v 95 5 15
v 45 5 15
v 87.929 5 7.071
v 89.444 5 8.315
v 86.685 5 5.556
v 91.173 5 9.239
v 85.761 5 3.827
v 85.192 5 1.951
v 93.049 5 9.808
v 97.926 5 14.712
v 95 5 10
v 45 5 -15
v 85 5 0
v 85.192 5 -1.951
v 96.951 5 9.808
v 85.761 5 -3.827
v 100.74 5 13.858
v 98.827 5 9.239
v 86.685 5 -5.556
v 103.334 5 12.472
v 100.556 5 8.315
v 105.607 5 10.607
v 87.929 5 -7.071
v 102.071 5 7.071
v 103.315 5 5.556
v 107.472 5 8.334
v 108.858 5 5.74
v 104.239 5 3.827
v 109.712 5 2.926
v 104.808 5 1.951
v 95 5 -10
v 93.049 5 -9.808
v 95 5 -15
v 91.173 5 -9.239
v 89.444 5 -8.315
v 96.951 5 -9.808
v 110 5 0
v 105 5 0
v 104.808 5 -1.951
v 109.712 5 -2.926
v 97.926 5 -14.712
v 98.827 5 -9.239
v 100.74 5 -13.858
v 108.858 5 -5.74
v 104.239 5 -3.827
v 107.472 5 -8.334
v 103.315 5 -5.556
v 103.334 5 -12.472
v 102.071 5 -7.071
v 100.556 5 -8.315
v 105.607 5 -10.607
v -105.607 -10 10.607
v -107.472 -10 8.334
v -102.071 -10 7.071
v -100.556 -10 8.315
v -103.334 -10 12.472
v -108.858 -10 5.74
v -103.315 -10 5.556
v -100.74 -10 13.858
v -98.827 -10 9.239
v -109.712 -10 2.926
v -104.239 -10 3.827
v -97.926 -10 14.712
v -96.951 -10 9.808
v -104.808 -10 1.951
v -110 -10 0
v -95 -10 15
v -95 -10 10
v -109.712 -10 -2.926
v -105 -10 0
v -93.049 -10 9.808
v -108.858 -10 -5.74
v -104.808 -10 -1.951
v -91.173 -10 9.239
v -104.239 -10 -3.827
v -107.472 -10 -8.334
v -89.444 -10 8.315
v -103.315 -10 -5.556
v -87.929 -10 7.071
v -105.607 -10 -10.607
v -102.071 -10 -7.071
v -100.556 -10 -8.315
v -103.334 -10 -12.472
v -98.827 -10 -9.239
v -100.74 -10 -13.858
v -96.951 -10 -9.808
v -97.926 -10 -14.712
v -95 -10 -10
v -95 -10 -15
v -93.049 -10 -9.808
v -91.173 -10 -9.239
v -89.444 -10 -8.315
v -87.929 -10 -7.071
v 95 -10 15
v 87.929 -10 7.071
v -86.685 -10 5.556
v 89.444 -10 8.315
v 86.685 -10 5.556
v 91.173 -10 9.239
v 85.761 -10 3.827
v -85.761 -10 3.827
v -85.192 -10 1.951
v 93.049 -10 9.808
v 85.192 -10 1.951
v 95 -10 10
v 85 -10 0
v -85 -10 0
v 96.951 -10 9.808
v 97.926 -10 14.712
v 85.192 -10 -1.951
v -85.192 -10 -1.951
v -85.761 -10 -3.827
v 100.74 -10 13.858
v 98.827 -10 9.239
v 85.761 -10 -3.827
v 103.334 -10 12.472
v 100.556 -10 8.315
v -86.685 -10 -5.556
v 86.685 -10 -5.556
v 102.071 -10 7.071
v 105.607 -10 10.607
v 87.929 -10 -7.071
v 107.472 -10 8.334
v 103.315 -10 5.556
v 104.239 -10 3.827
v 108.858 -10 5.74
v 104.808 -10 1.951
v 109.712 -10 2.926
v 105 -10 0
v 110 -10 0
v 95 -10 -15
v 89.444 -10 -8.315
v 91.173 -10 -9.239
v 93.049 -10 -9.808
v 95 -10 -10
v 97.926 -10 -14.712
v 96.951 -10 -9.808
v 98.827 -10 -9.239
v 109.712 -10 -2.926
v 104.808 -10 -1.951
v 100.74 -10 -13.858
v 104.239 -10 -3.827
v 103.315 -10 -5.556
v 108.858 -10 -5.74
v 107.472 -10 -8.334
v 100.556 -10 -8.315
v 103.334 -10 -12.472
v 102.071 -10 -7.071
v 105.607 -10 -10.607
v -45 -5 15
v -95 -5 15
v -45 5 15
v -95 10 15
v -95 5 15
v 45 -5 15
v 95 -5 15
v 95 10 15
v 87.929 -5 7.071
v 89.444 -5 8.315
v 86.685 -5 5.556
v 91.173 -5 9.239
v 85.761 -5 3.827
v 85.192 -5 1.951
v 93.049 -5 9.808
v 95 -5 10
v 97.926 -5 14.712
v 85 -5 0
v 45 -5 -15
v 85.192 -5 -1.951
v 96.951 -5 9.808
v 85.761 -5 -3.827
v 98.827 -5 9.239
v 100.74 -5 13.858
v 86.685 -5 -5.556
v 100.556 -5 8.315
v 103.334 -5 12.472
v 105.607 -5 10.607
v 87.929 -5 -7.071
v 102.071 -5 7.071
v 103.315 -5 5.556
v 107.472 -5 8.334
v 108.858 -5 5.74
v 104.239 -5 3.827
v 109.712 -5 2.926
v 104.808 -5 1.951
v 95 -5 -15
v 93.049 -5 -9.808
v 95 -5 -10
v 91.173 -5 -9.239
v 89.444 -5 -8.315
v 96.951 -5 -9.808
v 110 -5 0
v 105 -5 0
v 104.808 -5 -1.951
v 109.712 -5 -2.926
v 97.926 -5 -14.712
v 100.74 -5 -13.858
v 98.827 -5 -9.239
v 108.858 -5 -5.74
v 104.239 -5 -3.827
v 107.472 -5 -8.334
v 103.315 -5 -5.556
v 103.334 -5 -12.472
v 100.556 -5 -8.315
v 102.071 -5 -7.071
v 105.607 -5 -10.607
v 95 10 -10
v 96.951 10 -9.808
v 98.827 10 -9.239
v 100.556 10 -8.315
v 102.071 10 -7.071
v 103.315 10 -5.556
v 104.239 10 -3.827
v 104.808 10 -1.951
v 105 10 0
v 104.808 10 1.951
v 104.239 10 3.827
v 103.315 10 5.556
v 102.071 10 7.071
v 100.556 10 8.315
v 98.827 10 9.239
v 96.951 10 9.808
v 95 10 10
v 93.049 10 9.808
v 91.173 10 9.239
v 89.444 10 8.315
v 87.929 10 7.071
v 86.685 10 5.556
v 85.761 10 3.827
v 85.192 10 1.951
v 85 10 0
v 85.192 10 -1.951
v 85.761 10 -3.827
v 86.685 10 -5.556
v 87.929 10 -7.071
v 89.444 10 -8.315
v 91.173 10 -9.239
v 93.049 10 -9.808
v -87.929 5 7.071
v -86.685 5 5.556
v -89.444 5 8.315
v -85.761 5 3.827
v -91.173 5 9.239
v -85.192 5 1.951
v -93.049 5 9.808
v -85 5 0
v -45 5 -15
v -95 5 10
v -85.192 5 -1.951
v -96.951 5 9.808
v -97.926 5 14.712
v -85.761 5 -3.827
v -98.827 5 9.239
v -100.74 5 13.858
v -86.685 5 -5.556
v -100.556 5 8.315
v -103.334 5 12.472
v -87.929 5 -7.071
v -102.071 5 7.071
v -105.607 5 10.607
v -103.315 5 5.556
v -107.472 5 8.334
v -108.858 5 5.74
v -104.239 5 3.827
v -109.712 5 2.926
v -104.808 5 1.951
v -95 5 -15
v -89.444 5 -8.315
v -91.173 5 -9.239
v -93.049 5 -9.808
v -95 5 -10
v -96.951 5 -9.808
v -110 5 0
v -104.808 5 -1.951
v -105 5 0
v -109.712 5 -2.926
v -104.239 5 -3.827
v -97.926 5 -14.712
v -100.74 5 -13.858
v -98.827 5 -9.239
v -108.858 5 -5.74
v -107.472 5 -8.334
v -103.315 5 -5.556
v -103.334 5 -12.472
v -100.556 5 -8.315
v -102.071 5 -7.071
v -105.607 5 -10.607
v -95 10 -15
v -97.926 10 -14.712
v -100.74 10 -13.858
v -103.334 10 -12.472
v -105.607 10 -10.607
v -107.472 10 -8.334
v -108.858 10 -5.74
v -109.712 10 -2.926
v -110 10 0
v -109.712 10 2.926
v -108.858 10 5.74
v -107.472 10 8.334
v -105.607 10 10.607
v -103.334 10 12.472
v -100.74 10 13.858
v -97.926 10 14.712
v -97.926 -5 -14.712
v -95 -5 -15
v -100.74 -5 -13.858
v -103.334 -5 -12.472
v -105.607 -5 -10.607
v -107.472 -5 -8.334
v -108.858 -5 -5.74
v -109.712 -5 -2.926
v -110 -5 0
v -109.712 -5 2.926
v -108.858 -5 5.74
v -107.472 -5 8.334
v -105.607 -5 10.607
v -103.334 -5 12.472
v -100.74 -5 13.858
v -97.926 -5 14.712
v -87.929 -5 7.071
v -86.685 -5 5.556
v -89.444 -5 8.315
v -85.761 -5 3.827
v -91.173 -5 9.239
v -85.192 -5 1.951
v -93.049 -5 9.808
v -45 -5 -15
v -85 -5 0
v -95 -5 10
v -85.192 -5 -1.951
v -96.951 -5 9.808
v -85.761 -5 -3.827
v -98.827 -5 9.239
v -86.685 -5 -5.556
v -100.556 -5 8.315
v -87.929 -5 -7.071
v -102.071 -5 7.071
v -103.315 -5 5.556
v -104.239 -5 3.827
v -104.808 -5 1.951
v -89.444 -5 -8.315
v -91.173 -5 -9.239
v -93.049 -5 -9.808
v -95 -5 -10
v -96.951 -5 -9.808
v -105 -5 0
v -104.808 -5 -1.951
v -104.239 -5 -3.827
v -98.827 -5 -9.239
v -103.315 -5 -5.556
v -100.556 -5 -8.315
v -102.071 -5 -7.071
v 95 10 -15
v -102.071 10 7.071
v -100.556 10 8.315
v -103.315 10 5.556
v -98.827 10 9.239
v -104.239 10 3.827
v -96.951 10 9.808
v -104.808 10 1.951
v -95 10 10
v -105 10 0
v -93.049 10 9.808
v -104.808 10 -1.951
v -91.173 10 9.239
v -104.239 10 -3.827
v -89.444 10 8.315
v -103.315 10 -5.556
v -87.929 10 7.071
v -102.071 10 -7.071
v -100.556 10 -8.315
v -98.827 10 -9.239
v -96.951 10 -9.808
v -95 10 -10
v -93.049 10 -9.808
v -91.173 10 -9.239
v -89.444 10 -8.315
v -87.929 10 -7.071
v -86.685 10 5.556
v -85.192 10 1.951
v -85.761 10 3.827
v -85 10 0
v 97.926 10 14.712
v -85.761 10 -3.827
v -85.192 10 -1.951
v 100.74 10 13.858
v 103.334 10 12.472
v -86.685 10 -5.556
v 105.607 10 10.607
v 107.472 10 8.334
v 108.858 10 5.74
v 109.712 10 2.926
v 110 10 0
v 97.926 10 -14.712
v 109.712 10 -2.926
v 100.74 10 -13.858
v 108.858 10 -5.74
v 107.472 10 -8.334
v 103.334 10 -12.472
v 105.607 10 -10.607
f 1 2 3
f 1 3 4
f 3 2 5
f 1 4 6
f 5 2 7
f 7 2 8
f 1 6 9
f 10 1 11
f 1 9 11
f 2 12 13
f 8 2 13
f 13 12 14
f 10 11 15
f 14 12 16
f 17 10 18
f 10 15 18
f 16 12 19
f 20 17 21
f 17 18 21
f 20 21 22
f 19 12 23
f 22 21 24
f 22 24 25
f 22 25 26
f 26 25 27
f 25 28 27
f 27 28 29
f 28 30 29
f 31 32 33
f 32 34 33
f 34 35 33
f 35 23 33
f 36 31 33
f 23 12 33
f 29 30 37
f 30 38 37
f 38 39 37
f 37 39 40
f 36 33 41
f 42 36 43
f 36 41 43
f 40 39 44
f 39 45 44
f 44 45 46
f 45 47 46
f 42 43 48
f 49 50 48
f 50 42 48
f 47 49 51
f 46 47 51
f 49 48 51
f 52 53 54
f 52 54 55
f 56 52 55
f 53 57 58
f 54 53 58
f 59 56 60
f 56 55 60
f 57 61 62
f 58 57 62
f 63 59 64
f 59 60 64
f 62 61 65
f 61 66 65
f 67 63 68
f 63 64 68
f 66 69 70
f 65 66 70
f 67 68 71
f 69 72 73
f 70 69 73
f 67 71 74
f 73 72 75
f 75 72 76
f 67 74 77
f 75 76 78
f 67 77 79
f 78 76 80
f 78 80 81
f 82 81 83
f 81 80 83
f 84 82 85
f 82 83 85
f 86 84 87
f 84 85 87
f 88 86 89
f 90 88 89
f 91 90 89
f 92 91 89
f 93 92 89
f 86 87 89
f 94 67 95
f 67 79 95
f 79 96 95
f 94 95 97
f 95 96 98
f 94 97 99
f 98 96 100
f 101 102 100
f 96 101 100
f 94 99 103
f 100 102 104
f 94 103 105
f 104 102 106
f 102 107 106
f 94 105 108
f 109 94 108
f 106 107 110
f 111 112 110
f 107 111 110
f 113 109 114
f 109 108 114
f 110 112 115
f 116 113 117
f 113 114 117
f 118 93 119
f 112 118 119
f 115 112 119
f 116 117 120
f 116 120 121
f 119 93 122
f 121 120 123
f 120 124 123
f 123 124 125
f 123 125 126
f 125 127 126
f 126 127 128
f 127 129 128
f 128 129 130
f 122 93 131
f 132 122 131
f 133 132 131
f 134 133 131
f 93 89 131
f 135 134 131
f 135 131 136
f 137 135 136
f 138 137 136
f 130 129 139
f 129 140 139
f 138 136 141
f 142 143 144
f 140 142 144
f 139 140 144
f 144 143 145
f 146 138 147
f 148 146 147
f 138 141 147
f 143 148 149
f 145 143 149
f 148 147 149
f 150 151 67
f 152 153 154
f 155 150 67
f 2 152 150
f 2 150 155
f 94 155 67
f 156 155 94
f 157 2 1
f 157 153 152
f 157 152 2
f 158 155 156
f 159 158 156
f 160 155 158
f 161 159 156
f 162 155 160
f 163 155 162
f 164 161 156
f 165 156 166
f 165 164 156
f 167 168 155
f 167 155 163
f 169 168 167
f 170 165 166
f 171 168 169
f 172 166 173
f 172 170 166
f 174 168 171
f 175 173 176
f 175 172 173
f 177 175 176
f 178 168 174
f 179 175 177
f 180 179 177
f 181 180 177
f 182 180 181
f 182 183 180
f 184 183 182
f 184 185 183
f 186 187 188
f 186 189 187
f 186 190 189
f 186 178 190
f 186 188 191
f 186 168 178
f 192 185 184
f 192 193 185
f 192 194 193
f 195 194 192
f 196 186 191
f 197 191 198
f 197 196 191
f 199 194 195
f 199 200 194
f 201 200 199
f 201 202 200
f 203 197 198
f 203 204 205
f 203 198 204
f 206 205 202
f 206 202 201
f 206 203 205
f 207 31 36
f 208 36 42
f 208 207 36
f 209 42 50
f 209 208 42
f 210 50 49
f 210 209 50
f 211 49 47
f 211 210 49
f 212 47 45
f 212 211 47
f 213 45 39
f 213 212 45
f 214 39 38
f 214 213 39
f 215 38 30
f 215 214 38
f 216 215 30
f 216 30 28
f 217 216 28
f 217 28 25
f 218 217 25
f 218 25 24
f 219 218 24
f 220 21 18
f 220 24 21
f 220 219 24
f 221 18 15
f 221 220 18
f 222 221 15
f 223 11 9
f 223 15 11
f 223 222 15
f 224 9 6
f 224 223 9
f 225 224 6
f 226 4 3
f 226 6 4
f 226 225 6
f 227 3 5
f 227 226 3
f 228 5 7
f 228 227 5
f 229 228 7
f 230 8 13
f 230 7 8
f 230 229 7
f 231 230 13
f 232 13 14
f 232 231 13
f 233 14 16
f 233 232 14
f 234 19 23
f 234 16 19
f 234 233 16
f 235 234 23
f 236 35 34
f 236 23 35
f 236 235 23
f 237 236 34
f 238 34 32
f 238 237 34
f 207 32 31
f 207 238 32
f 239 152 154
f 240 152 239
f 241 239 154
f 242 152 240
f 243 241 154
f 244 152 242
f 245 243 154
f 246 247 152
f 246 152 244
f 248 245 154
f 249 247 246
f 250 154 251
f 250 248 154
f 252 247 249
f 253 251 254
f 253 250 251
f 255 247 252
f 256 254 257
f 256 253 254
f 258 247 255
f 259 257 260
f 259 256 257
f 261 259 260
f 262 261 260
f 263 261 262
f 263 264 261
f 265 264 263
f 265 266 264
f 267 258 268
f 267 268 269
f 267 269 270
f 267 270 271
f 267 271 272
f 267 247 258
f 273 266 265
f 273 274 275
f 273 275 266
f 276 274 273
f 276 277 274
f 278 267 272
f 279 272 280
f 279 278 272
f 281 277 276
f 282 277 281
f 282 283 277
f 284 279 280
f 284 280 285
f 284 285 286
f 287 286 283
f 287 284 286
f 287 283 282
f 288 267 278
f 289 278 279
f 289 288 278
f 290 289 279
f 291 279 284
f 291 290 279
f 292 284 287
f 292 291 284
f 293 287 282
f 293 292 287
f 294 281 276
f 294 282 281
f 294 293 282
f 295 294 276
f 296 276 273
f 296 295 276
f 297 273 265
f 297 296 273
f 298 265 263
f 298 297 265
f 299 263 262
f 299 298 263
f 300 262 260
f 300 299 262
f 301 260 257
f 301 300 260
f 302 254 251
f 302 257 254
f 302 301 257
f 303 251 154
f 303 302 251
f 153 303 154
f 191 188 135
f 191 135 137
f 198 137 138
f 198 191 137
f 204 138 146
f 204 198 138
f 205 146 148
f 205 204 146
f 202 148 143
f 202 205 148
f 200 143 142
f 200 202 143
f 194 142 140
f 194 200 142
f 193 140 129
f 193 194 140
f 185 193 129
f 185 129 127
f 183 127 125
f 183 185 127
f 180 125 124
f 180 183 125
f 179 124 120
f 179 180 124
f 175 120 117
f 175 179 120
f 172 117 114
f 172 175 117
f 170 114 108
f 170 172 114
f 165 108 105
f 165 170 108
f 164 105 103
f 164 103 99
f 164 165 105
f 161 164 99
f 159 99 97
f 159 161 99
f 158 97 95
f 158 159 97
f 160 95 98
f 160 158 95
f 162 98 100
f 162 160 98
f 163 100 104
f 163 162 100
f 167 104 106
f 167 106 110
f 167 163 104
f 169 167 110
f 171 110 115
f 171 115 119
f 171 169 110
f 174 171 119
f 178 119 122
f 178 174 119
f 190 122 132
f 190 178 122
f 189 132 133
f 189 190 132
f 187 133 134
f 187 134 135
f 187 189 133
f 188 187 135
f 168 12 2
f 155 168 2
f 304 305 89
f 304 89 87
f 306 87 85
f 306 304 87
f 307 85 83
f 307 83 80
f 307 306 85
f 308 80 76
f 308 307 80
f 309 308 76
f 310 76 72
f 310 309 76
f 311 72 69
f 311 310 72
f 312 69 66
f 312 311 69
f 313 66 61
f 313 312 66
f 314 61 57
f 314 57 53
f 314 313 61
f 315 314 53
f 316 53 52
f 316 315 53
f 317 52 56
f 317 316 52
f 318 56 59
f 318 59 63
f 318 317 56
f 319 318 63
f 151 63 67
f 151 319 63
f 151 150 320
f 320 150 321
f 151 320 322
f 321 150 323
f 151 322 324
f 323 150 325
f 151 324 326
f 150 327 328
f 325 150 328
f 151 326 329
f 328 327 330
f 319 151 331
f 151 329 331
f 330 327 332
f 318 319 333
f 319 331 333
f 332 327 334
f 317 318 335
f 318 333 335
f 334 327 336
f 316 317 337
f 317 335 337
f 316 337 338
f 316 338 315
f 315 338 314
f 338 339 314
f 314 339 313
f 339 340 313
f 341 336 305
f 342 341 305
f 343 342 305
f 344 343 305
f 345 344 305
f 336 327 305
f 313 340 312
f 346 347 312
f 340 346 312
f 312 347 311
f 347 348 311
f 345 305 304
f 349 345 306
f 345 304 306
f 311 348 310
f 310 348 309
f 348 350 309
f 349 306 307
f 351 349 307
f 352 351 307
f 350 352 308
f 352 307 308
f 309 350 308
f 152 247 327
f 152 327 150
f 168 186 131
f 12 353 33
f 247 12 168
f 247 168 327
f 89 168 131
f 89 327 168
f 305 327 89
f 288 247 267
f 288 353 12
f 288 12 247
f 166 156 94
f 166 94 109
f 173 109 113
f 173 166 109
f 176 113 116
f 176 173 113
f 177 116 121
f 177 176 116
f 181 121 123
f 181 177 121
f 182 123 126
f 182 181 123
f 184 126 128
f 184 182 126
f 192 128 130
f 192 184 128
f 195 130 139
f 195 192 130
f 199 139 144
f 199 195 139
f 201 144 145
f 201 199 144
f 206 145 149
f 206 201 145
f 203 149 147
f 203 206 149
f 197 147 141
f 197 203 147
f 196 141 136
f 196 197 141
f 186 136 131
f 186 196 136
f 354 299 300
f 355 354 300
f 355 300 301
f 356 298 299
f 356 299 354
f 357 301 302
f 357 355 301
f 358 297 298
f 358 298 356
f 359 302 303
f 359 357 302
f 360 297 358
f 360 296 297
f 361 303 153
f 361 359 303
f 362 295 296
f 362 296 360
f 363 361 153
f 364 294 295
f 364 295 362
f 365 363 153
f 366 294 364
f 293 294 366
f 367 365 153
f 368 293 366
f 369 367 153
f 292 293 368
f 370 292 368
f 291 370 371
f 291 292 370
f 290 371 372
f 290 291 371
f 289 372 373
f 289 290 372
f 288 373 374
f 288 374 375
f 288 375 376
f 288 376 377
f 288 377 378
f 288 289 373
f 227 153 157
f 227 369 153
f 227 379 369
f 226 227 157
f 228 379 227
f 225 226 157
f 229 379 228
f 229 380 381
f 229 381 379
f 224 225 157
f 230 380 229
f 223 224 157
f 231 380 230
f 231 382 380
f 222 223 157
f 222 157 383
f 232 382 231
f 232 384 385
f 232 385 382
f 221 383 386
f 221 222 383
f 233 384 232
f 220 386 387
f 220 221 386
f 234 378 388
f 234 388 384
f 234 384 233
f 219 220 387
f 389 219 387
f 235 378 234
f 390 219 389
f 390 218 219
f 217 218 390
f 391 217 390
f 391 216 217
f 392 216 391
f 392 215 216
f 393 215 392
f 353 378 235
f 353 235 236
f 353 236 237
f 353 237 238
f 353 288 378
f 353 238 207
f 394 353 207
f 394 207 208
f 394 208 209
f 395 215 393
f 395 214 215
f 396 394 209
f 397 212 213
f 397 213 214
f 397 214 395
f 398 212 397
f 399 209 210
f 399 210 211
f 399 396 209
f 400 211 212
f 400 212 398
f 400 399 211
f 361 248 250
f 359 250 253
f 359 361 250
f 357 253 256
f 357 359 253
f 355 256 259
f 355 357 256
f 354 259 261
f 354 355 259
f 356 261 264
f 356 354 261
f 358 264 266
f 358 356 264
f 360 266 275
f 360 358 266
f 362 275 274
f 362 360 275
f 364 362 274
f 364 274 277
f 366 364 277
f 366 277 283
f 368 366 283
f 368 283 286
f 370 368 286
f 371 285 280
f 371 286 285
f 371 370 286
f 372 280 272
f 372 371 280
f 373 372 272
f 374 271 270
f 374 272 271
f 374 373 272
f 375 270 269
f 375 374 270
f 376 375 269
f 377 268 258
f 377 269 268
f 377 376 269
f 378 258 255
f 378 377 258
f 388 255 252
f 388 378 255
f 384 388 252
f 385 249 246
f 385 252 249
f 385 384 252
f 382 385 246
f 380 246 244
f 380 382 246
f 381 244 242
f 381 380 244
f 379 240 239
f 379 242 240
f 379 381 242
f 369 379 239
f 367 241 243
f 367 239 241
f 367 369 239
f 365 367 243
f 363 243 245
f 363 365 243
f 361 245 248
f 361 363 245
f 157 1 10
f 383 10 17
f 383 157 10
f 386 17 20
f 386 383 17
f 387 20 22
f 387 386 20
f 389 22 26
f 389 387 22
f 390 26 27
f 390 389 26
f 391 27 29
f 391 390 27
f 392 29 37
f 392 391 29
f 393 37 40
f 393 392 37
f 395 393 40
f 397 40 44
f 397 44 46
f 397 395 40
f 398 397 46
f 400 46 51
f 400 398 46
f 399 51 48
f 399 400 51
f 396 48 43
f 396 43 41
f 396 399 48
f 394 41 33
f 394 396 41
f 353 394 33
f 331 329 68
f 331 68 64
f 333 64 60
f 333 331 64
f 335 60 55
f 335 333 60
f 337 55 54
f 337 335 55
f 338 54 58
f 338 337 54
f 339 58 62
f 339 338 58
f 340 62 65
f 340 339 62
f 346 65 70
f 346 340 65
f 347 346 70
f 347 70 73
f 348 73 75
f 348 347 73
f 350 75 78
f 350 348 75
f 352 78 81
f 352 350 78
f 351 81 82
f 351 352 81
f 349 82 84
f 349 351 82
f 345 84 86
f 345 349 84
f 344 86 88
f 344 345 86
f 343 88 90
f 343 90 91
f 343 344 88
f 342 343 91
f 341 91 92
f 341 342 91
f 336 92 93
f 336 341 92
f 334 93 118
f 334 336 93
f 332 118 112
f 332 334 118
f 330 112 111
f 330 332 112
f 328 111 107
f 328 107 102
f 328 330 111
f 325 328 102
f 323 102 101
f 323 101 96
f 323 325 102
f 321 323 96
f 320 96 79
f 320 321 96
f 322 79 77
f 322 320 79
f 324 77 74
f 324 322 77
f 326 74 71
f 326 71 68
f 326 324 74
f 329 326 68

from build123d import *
from build123d.topology import SkipClean

# Parameters (mm, degrees)
EXTRUDE_1_DEPTH     = 10
CUT_EXTRUDE_1_DEPTH = 5


with BuildPart() as part:
    # 草圖1 → 填料-伸長1 (new, symmetric)
    with BuildSketch(Plane(origin=(0, 0, 0), x_dir=(1, 0, 0), z_dir=(0, 1, 0))):
        with BuildLine():
            Line((95.00000000000004, 14.999999999999998), (-94.99999999999996, 15))
            ThreePointArc((-94.99999999999996, 14.999999999999998), (-84.39339828220174, 10.606601717798211), (-79.99999999999996, 0))
            ThreePointArc((-79.99999999999996, -3.67e-15), (-84.39339828220174, -10.606601717798204), (-94.99999999999994, -14.999999999999998))
            Line((-94.99999999999994, -14.999999999999961), (95.00000000000006, -14.999999999999998))
            ThreePointArc((95.00000000000004, -14.999999999999998), (80.00000000000004, 1.84e-15), (95.00000000000004, 14.999999999999998))
        make_face()
        with BuildLine():
            ThreePointArc((-79.99999999999996, 0), (-84.39339828220174, 10.606601717798211), (-94.99999999999996, 14.999999999999998))
            Line((-94.99999999999996, 15), (-94.99999999999996, 10.000000000000009))
            ThreePointArc((-95, 10.000000000000009), (-87.9289321881345, 7.071067811865497), (-84.99999999999994, 0))
            ThreePointArc((-84.99999999999994, -2.45e-15), (-87.9289321881345, -7.071067811865502), (-95, -10.000000000000009))
            Line((-94.99999999999994, -10.000000000000007), (-94.99999999999994, -14.999999999999961))
            ThreePointArc((-94.99999999999994, -14.999999999999998), (-84.39339828220174, -10.606601717798204), (-79.99999999999996, -3.67e-15))
        make_face()
        with BuildLine():
            Line((-94.99999999999996, 10.000000000000009), (-94.99999999999996, 15))
            ThreePointArc((-94.99999999999996, 14.999999999999998), (-109.99999999999996, -4.82e-15), (-94.99999999999994, -14.999999999999998))
            Line((-94.99999999999994, -14.999999999999961), (-94.99999999999994, -10.000000000000007))
            ThreePointArc((-95, -10.000000000000009), (-104.99999999999997, 1.22e-15), (-95, 10.000000000000009))
        make_face()
        with BuildLine():
            ThreePointArc((-79.99999999999996, 0), (-84.39339828220174, 10.606601717798211), (-94.99999999999996, 14.999999999999998))
            Line((-94.99999999999996, 15), (-94.99999999999996, 10.000000000000009))
            ThreePointArc((-95, 10.000000000000009), (-87.9289321881345, 7.071067811865497), (-84.99999999999994, 0))
            ThreePointArc((-84.99999999999994, -2.45e-15), (-87.9289321881345, -7.071067811865502), (-95, -10.000000000000009))
            Line((-94.99999999999994, -10.000000000000007), (-94.99999999999994, -14.999999999999961))
            ThreePointArc((-94.99999999999994, -14.999999999999998), (-84.39339828220174, -10.606601717798204), (-79.99999999999996, -3.67e-15))
        make_face()
        with BuildLine():
            Line((-94.99999999999996, 10.000000000000009), (-94.99999999999996, 15))
            ThreePointArc((-94.99999999999996, 14.999999999999998), (-109.99999999999996, -4.82e-15), (-94.99999999999994, -14.999999999999998))
            Line((-94.99999999999994, -14.999999999999961), (-94.99999999999994, -10.000000000000007))
            ThreePointArc((-95, -10.000000000000009), (-104.99999999999997, 1.22e-15), (-95, 10.000000000000009))
        make_face()
        with BuildLine():
            ThreePointArc((110.00000000000004, 0), (105.60660171779826, 10.606601717798211), (95.00000000000004, 14.999999999999998))
            Line((95.00000000000004, 14.999999999999998), (95.00000000000004, 10.000000000000009))
            ThreePointArc((95, 10.000000000000009), (102.0710678118655, 7.071067811865497), (105.00000000000006, 0))
            ThreePointArc((105.00000000000006, -2.45e-15), (102.0710678118655, -7.071067811865502), (95, -10.000000000000009))
            Line((95.00000000000004, -10.000000000000009), (95.00000000000004, -14.999999999999998))
            ThreePointArc((95.00000000000004, -14.999999999999998), (105.60660171779826, -10.606601717798213), (110.00000000000004, -3.67e-15))
        make_face()
        with BuildLine():
            Line((95.00000000000004, 10.000000000000009), (95.00000000000004, 14.999999999999998))
            ThreePointArc((95.00000000000004, 14.999999999999998), (80.00000000000004, 1.84e-15), (95.00000000000004, -14.999999999999998))
            Line((95.00000000000004, -14.999999999999998), (95.00000000000004, -10.000000000000009))
            ThreePointArc((95, -10.000000000000009), (85.00000000000003, 1.22e-15), (95, 10.000000000000009))
        make_face()
        with BuildLine():
            ThreePointArc((110.00000000000004, 0), (105.60660171779826, 10.606601717798211), (95.00000000000004, 14.999999999999998))
            Line((95.00000000000004, 14.999999999999998), (95.00000000000004, 10.000000000000009))
            ThreePointArc((95, 10.000000000000009), (102.0710678118655, 7.071067811865497), (105.00000000000006, 0))
            ThreePointArc((105.00000000000006, -2.45e-15), (102.0710678118655, -7.071067811865502), (95, -10.000000000000009))
            Line((95.00000000000004, -10.000000000000009), (95.00000000000004, -14.999999999999998))
            ThreePointArc((95.00000000000004, -14.999999999999998), (105.60660171779826, -10.606601717798213), (110.00000000000004, -3.67e-15))
        make_face()
        with BuildLine():
            Line((95.00000000000004, 10.000000000000009), (95.00000000000004, 14.999999999999998))
            ThreePointArc((95.00000000000004, 14.999999999999998), (80.00000000000004, 1.84e-15), (95.00000000000004, -14.999999999999998))
            Line((95.00000000000004, -14.999999999999998), (95.00000000000004, -10.000000000000009))
            ThreePointArc((95, -10.000000000000009), (85.00000000000003, 1.22e-15), (95, 10.000000000000009))
        make_face()
    extrude(amount=EXTRUDE_1_DEPTH, both=True)

    # 草圖2 → 除料-伸長1 (cut, symmetric)
    with SkipClean():  # the faces are left unmerged after this step: merging them gives an invalid solid
        with BuildSketch(Plane(origin=(0, 0, 0), x_dir=(1, 0, 0), z_dir=(0, 1, 0))):
            with BuildLine():
                Line((-44.99999999999994, 14.99999999999999), (-44.99999999999996, -14.999999999999977))
                Line((-44.99999999999996, -14.999999999999977), (-94.99999999999994, -14.99999999999998))
                ThreePointArc((-94.99999999999994, -14.99999999999998), (-109.99999999999994, -4.82e-15), (-94.99999999999996, 14.99999999999998))
                Line((-94.99999999999996, 14.99999999999998), (-44.99999999999994, 14.99999999999999))
            make_face()
        cut_extrude_1 = extrude(amount=CUT_EXTRUDE_1_DEPTH, both=True, mode=Mode.SUBTRACT)

    # 鏡射1: 除料-伸長1 across plane
    with SkipClean():  # the faces are left unmerged after this step: merging them gives an invalid solid
        add(cut_extrude_1.mirror(Plane(origin=(0, 0, 0), x_dir=(0, 0, 1), z_dir=(1, 0, 0))), mode=Mode.SUBTRACT)


solid = part.part
